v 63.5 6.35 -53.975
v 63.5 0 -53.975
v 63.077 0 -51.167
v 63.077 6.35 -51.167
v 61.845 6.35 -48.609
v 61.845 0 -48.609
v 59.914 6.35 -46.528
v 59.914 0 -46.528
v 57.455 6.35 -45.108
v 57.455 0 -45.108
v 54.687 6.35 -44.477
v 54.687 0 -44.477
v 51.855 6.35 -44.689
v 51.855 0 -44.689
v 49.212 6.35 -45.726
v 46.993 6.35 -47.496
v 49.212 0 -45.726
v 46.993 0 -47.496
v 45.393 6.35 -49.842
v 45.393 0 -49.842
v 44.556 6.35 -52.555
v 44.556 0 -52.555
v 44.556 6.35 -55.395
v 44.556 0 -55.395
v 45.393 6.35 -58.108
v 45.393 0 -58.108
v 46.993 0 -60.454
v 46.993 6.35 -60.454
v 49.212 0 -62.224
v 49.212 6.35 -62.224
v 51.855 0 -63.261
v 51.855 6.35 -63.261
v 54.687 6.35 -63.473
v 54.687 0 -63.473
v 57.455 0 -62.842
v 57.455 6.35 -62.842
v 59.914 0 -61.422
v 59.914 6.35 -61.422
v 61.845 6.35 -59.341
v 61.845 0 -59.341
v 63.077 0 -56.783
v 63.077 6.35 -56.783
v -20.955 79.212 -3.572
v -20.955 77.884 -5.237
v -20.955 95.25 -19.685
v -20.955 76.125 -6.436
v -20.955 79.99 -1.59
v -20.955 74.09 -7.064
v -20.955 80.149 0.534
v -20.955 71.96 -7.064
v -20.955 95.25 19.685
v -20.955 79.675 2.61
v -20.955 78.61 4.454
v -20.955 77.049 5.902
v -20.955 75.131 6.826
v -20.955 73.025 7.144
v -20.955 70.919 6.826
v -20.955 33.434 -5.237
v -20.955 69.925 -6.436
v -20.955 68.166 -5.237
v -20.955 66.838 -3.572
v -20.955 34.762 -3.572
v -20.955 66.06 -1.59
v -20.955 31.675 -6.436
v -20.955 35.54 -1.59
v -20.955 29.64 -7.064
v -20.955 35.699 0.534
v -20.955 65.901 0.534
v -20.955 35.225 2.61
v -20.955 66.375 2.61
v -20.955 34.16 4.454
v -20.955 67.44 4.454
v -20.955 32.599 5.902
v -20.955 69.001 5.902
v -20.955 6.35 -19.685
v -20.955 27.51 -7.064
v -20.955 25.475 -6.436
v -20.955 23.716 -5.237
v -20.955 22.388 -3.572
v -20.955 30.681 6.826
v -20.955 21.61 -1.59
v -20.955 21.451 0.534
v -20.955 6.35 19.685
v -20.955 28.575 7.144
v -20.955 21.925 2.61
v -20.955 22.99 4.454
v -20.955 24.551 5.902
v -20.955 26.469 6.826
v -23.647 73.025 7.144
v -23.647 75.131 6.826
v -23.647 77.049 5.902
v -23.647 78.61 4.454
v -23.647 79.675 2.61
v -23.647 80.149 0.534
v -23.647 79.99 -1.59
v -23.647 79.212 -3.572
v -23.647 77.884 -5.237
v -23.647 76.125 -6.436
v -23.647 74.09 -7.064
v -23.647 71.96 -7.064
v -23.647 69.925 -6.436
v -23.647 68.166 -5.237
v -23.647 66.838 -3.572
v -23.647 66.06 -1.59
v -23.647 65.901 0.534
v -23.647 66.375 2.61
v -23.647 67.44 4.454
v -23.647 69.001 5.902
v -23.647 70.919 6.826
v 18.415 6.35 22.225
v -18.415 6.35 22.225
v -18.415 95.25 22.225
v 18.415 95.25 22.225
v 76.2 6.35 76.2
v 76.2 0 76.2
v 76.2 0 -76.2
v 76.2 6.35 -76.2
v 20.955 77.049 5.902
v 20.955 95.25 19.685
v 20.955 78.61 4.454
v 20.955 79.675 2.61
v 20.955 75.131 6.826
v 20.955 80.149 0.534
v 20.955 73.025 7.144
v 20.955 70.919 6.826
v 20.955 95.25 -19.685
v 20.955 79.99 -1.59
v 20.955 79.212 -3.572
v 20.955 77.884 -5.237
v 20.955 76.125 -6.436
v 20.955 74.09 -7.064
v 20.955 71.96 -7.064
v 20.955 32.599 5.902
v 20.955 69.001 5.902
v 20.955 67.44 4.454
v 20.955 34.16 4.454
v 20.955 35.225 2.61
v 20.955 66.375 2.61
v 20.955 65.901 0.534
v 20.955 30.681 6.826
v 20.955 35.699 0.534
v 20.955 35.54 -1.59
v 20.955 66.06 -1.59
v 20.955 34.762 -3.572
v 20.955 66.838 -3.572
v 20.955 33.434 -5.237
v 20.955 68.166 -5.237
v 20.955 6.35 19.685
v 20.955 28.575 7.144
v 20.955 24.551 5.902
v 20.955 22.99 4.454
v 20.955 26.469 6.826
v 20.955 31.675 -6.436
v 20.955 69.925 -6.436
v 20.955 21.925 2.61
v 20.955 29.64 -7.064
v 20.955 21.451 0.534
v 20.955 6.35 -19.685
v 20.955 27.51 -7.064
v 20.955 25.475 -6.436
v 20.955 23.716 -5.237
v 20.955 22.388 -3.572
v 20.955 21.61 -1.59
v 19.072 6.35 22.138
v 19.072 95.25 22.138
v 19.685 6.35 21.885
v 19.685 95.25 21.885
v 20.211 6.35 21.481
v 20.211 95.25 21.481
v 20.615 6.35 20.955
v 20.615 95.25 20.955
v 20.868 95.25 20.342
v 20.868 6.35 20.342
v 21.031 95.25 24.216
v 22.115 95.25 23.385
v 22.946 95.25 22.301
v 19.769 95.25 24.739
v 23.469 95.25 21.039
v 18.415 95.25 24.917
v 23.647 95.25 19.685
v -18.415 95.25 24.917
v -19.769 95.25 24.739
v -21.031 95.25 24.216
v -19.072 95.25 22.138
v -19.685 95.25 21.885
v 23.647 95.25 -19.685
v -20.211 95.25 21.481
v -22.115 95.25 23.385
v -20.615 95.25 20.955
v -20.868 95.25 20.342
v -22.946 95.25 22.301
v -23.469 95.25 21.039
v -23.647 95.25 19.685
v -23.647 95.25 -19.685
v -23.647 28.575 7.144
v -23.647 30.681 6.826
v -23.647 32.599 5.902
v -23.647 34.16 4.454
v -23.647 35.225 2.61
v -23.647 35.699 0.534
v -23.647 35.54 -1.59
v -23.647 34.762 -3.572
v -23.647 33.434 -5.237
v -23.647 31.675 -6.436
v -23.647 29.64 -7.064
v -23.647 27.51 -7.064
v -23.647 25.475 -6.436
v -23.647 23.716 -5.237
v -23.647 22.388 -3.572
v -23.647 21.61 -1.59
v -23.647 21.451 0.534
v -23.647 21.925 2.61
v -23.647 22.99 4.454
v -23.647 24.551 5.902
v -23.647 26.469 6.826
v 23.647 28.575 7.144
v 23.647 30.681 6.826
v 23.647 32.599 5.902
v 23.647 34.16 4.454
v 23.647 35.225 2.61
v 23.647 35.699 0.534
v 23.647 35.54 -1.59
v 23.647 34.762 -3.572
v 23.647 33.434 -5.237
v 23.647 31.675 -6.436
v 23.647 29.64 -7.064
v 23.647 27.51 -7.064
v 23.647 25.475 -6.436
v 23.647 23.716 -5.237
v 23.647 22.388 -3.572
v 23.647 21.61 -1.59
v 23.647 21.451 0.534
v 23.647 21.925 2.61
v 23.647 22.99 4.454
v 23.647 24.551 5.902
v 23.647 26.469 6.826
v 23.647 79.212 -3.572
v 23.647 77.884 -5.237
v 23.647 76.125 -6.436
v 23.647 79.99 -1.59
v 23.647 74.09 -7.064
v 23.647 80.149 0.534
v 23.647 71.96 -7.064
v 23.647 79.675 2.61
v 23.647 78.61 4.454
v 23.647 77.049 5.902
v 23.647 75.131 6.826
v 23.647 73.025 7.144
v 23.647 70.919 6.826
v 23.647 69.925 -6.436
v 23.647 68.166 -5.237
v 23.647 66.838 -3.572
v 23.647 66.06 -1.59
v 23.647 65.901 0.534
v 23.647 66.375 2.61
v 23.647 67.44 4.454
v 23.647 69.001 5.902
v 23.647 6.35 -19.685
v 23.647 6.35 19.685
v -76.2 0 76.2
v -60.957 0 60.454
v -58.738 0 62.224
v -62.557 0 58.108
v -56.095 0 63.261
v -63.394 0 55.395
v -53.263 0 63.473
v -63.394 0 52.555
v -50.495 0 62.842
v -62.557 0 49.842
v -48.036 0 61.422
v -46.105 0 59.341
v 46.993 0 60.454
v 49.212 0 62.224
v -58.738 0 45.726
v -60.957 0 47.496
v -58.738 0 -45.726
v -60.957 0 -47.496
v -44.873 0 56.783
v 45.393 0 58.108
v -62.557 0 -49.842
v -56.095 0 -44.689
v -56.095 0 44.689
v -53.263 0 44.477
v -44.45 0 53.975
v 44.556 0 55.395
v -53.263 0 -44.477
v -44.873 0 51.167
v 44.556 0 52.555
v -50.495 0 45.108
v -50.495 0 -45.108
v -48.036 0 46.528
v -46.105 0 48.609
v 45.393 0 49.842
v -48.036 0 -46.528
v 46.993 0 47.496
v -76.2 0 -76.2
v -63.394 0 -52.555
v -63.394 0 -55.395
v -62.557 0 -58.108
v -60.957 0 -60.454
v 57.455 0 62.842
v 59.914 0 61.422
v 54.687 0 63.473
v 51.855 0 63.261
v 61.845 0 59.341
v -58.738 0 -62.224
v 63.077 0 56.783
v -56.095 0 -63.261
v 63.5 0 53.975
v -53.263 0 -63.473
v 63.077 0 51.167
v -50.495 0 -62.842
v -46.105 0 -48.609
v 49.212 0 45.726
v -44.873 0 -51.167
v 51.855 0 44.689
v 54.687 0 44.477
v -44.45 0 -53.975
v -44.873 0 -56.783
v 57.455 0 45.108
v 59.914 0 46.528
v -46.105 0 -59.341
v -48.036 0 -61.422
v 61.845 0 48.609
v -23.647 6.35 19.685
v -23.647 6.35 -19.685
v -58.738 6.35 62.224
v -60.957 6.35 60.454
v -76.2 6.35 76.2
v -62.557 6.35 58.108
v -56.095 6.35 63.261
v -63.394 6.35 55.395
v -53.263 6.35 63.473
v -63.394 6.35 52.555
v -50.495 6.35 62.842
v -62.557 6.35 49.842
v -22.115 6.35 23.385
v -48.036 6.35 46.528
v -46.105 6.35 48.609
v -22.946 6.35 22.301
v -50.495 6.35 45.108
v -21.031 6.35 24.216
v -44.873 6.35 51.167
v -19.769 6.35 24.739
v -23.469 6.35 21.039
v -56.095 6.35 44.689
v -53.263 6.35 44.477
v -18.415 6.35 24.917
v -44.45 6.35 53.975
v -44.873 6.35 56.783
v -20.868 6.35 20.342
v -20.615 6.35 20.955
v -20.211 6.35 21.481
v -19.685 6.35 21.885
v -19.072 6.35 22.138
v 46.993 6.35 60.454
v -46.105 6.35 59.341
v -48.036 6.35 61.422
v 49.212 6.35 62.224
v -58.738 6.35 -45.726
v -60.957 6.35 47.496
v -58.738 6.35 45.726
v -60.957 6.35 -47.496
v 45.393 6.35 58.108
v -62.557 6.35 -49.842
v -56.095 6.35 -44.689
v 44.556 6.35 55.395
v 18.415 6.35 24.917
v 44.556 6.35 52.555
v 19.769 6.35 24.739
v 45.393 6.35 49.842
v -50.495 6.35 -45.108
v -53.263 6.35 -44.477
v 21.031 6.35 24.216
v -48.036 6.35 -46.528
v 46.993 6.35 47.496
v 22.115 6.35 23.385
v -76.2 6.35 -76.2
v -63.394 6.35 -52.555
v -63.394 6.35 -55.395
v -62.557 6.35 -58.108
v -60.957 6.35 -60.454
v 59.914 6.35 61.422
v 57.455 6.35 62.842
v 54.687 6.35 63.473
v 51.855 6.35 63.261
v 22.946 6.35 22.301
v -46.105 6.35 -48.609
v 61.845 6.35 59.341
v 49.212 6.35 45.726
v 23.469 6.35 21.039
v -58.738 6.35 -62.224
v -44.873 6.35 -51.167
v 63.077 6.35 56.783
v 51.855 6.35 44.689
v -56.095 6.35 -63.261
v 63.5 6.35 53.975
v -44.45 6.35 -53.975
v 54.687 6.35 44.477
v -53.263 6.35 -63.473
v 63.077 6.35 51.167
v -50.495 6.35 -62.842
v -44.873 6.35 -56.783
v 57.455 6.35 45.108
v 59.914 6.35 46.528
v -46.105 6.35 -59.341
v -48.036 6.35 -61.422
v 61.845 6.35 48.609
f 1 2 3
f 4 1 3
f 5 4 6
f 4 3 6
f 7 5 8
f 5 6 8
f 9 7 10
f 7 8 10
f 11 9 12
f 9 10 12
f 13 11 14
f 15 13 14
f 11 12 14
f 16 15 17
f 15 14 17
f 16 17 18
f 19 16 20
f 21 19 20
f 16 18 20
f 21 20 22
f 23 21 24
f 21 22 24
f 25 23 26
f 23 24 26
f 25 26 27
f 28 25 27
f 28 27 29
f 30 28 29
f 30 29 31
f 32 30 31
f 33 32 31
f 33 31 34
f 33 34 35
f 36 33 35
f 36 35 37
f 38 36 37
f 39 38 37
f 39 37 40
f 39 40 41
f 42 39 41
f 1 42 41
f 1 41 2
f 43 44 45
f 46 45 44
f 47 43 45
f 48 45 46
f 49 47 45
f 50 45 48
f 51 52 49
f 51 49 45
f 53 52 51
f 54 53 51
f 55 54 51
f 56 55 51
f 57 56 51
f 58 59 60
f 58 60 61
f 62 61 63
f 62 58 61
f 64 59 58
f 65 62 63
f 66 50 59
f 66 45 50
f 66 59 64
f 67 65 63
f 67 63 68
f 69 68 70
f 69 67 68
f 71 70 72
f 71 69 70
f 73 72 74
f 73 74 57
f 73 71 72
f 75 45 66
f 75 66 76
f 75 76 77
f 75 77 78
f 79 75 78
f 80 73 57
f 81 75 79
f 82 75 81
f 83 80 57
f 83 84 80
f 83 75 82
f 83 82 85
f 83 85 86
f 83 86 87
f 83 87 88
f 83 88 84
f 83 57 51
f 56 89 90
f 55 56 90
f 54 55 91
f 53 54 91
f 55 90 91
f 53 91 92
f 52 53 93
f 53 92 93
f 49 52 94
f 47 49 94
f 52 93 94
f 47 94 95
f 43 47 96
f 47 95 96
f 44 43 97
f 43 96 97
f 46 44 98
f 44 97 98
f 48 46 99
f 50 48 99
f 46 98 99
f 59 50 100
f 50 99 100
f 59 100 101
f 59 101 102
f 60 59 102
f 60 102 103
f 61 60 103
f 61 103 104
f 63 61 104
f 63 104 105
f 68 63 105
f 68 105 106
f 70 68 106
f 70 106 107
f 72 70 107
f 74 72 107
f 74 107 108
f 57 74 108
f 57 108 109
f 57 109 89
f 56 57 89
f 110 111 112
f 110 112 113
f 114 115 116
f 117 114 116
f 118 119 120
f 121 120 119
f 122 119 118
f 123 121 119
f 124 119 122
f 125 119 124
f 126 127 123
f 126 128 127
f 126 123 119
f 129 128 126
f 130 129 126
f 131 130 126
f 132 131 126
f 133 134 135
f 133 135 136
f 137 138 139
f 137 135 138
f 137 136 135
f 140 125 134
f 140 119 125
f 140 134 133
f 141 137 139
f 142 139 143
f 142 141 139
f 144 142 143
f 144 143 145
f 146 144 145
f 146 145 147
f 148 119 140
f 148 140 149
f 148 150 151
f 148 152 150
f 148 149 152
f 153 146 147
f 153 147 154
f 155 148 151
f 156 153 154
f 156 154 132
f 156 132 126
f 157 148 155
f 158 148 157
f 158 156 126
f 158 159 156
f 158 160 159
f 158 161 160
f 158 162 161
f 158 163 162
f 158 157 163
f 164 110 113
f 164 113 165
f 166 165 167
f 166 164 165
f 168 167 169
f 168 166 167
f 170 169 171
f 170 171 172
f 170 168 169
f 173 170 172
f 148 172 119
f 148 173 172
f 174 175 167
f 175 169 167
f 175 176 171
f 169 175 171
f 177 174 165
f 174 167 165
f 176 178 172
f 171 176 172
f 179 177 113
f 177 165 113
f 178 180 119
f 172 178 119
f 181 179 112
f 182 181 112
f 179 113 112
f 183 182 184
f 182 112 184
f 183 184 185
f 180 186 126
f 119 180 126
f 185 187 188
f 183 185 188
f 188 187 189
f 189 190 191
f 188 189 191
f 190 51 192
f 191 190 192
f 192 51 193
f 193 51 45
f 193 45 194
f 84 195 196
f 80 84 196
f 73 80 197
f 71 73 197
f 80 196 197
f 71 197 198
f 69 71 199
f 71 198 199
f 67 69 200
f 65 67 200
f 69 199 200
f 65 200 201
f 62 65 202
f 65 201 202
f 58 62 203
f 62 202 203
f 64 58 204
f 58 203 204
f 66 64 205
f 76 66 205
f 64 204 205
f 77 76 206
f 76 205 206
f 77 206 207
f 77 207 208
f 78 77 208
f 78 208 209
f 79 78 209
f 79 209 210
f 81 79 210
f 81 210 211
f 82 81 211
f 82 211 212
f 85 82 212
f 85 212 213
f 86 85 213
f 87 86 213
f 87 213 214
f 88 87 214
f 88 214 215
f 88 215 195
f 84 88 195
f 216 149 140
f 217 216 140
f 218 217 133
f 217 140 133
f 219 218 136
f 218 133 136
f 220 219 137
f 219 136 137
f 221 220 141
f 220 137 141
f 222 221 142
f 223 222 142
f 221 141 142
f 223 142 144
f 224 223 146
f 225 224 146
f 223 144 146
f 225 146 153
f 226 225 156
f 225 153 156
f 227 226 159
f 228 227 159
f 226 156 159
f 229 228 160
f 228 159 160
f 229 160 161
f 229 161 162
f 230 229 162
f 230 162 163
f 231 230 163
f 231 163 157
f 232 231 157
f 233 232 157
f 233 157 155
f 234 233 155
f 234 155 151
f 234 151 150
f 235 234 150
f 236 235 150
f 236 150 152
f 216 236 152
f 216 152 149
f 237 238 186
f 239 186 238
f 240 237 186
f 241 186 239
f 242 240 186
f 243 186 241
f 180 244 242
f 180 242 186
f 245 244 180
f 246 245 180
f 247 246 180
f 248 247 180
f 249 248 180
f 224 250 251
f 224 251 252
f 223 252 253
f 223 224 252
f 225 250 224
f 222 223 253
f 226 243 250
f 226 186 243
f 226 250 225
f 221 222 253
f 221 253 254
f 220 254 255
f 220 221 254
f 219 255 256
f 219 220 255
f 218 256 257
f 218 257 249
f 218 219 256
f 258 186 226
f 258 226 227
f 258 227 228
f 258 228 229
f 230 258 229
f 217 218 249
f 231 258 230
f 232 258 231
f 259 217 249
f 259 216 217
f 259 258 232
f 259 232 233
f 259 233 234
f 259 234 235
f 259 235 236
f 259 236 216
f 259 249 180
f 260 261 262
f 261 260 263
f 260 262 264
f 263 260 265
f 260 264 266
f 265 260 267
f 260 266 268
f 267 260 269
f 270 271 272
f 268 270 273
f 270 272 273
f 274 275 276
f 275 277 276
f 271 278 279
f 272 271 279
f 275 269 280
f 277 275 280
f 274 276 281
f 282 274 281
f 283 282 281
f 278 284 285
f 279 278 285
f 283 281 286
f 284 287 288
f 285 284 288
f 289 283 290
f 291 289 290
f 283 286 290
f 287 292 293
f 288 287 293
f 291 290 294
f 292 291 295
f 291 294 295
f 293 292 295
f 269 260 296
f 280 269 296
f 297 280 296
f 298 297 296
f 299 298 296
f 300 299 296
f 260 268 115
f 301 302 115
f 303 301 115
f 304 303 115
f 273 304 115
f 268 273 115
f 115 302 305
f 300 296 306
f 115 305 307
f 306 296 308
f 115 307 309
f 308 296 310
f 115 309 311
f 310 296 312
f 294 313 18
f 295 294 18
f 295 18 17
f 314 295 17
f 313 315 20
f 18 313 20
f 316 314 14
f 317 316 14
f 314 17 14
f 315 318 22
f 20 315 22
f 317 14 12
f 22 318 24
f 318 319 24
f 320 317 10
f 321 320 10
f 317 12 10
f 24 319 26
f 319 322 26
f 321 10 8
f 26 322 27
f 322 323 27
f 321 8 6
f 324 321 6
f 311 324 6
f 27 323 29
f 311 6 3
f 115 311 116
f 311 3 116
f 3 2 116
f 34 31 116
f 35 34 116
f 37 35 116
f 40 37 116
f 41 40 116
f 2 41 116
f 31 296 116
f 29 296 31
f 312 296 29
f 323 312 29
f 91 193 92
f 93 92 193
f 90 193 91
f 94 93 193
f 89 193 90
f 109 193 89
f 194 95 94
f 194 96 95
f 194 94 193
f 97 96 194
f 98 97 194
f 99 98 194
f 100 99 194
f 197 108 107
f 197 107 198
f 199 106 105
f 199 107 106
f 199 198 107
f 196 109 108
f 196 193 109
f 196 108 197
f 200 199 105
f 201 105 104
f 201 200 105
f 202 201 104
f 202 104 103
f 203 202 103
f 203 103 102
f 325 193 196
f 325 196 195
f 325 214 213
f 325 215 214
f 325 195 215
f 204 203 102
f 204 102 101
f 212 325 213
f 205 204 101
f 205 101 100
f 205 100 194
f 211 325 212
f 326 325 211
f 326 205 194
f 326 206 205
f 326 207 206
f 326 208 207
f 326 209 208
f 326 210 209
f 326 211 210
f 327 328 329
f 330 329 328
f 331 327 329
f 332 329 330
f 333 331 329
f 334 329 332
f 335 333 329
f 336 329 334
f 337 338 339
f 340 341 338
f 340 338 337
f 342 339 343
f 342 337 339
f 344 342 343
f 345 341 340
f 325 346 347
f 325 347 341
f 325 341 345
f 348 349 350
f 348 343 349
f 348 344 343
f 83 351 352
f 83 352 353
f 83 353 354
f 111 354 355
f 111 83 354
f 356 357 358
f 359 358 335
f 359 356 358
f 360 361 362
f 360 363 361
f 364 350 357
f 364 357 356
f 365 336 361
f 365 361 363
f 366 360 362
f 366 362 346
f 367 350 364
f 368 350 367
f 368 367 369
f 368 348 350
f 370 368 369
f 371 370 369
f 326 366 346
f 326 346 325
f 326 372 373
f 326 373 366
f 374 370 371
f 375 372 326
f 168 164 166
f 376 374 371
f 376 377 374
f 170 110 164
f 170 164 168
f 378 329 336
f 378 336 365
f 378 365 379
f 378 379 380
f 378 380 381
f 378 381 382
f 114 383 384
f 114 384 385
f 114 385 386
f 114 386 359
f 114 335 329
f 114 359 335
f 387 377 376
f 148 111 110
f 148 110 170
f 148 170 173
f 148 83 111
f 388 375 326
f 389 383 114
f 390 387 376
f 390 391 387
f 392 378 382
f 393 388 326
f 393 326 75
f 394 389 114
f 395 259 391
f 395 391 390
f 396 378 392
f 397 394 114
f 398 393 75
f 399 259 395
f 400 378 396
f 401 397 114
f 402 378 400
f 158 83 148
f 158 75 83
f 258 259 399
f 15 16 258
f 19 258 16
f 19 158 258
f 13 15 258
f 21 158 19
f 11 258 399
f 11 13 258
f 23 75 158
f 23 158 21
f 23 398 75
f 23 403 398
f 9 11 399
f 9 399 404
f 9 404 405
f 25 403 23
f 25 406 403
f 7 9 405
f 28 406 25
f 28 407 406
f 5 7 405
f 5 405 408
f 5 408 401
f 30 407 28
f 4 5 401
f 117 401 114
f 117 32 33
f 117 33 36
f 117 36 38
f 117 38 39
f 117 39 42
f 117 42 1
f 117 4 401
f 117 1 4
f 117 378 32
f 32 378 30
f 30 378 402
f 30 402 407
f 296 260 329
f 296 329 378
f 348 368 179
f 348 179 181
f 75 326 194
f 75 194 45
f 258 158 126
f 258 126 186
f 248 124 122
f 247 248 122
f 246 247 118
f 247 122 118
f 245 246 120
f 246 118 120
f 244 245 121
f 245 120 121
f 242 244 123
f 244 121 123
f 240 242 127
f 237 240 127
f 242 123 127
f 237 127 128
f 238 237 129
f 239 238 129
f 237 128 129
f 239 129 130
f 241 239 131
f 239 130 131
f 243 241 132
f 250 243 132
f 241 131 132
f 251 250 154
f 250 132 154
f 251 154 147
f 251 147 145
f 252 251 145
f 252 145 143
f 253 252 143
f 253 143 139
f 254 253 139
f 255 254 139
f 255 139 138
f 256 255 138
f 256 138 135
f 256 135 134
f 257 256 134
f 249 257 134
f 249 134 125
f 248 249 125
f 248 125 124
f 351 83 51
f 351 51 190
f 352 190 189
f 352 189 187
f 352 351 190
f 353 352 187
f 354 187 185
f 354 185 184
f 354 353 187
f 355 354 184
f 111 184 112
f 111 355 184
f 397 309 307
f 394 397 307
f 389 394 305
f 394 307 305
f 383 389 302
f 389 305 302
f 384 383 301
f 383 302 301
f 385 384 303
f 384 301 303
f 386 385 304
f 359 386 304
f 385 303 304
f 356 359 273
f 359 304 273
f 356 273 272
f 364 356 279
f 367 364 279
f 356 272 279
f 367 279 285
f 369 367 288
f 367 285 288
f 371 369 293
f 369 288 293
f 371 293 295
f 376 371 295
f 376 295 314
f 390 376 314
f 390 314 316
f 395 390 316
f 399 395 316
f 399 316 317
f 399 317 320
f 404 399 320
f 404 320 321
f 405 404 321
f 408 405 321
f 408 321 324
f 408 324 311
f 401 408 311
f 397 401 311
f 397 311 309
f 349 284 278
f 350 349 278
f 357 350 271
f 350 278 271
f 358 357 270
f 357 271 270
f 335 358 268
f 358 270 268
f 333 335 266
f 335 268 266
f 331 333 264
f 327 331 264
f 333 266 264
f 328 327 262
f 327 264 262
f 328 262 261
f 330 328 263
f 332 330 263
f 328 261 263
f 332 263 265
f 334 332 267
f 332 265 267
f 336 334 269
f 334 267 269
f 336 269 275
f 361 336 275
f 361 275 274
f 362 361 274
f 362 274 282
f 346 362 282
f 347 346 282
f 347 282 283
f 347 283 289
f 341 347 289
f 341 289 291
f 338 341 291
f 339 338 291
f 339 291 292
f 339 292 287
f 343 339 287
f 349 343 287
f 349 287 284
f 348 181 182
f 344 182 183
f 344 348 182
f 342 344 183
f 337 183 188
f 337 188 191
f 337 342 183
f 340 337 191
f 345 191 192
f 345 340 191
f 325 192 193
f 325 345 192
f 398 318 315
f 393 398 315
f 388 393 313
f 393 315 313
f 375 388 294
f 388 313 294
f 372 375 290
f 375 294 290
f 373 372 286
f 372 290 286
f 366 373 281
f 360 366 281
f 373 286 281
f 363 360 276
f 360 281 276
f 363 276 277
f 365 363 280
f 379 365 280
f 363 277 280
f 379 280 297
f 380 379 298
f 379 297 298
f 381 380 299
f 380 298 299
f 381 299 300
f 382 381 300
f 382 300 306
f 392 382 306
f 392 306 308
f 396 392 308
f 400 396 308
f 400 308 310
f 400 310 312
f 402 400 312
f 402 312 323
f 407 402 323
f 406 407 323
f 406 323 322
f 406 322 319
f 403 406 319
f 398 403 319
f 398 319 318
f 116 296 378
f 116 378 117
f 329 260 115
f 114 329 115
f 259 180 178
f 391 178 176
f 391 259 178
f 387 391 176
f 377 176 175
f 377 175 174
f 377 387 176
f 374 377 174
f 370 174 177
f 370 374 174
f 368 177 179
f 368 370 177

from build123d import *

# Parameters (mm, degrees)
SKETCH1_W                          = 152.4
SKETCH1_H                          = 152.4
EXTRUDE1_DEPTH                     = 6.35
F_3_4_0_75_DIAMETER_HOLE1_D        = 19.05
F_3_4_0_75_DIAMETER_HOLE1_DEPTH    = 112.776
F_3_4_0_75_DIAMETER_HOLE1_TIP      = 5.723197396
EXTRUDE_THIN1_DEPTH                = 88.9
F_9_16_0_5625_DIAMETER_HOLE1_D     = 14.2875
F_9_16_0_5625_DIAMETER_HOLE1_DEPTH = 112.776
F_9_16_0_5625_DIAMETER_HOLE1_TIP   = 4.292398047


with BuildPart() as part:
    # Sketch1 → Extrude1 (new body)
    with BuildSketch(Plane(origin=(0, 0, 0), x_dir=(1, 0, 0), z_dir=(0, 1, 0))):
        Rectangle(SKETCH1_W, SKETCH1_H)
    extrude(amount=EXTRUDE1_DEPTH)

    # 3/4 (0.75) Diameter Hole1
    with Locations(Plane(origin=(0, 6.35, 0), x_dir=(-1, 0, 0), z_dir=(0, 1, 0))):
        with Locations((53.975, -53.975), (-53.975, -53.975), (-53.975, 53.975), (53.975, 53.975)):
            Hole(F_3_4_0_75_DIAMETER_HOLE1_D / 2, depth=F_3_4_0_75_DIAMETER_HOLE1_DEPTH)
            with Locations((0, 0, -(F_3_4_0_75_DIAMETER_HOLE1_DEPTH + F_3_4_0_75_DIAMETER_HOLE1_TIP / 2))):  # 118° drill point
                Cone(0, F_3_4_0_75_DIAMETER_HOLE1_D / 2, F_3_4_0_75_DIAMETER_HOLE1_TIP, mode=Mode.SUBTRACT)

    # Sketch4 → Extrude-Thin1 (add)
    with BuildSketch(Plane(origin=(0, 6.35, 0), x_dir=(1, 0, 0), z_dir=(0, 1, 0))):
        with BuildLine():
            Line((-20.955, 19.685), (-20.955, -19.685))
            ThreePointArc((-20.955, -19.685), (-20.211051224, -21.481051224), (-18.415, -22.225))
            Line((-18.415, -22.225), (18.415, -22.225))
            ThreePointArc((18.415, -22.225), (20.211051224, -21.481051224), (20.955, -19.685))
            Line((20.955, -19.685), (20.955, 19.685))
            Line((20.955, 19.685), (23.6474, 19.685))
            Line((23.6474, 19.685), (23.6474, -19.685))
            ThreePointArc((23.6474, -19.685), (22.114865522, -23.384865522), (18.415, -24.9174))
            Line((18.415, -24.9174), (-18.415, -24.9174))
            ThreePointArc((-18.415, -24.9174), (-22.114865522, -23.384865522), (-23.6474, -19.685))
            Line((-23.6474, -19.685), (-23.6474, 19.685))
            Line((-23.6474, 19.685), (-20.955, 19.685))
        make_face()
    extrude(amount=EXTRUDE_THIN1_DEPTH)

    # 9/16 (0.5625) Diameter Hole1
    with Locations(Plane(origin=(23.6474, 0, 0), x_dir=(0, 0, -1), z_dir=(1, 0, 0))):
        with Locations((0, 73.025), (0, 28.575)):
            Hole(F_9_16_0_5625_DIAMETER_HOLE1_D / 2, depth=F_9_16_0_5625_DIAMETER_HOLE1_DEPTH)
            with Locations((0, 0, -(F_9_16_0_5625_DIAMETER_HOLE1_DEPTH + F_9_16_0_5625_DIAMETER_HOLE1_TIP / 2))):  # 118° drill point
                Cone(0, F_9_16_0_5625_DIAMETER_HOLE1_D / 2, F_9_16_0_5625_DIAMETER_HOLE1_TIP, mode=Mode.SUBTRACT)


solid = part.part
